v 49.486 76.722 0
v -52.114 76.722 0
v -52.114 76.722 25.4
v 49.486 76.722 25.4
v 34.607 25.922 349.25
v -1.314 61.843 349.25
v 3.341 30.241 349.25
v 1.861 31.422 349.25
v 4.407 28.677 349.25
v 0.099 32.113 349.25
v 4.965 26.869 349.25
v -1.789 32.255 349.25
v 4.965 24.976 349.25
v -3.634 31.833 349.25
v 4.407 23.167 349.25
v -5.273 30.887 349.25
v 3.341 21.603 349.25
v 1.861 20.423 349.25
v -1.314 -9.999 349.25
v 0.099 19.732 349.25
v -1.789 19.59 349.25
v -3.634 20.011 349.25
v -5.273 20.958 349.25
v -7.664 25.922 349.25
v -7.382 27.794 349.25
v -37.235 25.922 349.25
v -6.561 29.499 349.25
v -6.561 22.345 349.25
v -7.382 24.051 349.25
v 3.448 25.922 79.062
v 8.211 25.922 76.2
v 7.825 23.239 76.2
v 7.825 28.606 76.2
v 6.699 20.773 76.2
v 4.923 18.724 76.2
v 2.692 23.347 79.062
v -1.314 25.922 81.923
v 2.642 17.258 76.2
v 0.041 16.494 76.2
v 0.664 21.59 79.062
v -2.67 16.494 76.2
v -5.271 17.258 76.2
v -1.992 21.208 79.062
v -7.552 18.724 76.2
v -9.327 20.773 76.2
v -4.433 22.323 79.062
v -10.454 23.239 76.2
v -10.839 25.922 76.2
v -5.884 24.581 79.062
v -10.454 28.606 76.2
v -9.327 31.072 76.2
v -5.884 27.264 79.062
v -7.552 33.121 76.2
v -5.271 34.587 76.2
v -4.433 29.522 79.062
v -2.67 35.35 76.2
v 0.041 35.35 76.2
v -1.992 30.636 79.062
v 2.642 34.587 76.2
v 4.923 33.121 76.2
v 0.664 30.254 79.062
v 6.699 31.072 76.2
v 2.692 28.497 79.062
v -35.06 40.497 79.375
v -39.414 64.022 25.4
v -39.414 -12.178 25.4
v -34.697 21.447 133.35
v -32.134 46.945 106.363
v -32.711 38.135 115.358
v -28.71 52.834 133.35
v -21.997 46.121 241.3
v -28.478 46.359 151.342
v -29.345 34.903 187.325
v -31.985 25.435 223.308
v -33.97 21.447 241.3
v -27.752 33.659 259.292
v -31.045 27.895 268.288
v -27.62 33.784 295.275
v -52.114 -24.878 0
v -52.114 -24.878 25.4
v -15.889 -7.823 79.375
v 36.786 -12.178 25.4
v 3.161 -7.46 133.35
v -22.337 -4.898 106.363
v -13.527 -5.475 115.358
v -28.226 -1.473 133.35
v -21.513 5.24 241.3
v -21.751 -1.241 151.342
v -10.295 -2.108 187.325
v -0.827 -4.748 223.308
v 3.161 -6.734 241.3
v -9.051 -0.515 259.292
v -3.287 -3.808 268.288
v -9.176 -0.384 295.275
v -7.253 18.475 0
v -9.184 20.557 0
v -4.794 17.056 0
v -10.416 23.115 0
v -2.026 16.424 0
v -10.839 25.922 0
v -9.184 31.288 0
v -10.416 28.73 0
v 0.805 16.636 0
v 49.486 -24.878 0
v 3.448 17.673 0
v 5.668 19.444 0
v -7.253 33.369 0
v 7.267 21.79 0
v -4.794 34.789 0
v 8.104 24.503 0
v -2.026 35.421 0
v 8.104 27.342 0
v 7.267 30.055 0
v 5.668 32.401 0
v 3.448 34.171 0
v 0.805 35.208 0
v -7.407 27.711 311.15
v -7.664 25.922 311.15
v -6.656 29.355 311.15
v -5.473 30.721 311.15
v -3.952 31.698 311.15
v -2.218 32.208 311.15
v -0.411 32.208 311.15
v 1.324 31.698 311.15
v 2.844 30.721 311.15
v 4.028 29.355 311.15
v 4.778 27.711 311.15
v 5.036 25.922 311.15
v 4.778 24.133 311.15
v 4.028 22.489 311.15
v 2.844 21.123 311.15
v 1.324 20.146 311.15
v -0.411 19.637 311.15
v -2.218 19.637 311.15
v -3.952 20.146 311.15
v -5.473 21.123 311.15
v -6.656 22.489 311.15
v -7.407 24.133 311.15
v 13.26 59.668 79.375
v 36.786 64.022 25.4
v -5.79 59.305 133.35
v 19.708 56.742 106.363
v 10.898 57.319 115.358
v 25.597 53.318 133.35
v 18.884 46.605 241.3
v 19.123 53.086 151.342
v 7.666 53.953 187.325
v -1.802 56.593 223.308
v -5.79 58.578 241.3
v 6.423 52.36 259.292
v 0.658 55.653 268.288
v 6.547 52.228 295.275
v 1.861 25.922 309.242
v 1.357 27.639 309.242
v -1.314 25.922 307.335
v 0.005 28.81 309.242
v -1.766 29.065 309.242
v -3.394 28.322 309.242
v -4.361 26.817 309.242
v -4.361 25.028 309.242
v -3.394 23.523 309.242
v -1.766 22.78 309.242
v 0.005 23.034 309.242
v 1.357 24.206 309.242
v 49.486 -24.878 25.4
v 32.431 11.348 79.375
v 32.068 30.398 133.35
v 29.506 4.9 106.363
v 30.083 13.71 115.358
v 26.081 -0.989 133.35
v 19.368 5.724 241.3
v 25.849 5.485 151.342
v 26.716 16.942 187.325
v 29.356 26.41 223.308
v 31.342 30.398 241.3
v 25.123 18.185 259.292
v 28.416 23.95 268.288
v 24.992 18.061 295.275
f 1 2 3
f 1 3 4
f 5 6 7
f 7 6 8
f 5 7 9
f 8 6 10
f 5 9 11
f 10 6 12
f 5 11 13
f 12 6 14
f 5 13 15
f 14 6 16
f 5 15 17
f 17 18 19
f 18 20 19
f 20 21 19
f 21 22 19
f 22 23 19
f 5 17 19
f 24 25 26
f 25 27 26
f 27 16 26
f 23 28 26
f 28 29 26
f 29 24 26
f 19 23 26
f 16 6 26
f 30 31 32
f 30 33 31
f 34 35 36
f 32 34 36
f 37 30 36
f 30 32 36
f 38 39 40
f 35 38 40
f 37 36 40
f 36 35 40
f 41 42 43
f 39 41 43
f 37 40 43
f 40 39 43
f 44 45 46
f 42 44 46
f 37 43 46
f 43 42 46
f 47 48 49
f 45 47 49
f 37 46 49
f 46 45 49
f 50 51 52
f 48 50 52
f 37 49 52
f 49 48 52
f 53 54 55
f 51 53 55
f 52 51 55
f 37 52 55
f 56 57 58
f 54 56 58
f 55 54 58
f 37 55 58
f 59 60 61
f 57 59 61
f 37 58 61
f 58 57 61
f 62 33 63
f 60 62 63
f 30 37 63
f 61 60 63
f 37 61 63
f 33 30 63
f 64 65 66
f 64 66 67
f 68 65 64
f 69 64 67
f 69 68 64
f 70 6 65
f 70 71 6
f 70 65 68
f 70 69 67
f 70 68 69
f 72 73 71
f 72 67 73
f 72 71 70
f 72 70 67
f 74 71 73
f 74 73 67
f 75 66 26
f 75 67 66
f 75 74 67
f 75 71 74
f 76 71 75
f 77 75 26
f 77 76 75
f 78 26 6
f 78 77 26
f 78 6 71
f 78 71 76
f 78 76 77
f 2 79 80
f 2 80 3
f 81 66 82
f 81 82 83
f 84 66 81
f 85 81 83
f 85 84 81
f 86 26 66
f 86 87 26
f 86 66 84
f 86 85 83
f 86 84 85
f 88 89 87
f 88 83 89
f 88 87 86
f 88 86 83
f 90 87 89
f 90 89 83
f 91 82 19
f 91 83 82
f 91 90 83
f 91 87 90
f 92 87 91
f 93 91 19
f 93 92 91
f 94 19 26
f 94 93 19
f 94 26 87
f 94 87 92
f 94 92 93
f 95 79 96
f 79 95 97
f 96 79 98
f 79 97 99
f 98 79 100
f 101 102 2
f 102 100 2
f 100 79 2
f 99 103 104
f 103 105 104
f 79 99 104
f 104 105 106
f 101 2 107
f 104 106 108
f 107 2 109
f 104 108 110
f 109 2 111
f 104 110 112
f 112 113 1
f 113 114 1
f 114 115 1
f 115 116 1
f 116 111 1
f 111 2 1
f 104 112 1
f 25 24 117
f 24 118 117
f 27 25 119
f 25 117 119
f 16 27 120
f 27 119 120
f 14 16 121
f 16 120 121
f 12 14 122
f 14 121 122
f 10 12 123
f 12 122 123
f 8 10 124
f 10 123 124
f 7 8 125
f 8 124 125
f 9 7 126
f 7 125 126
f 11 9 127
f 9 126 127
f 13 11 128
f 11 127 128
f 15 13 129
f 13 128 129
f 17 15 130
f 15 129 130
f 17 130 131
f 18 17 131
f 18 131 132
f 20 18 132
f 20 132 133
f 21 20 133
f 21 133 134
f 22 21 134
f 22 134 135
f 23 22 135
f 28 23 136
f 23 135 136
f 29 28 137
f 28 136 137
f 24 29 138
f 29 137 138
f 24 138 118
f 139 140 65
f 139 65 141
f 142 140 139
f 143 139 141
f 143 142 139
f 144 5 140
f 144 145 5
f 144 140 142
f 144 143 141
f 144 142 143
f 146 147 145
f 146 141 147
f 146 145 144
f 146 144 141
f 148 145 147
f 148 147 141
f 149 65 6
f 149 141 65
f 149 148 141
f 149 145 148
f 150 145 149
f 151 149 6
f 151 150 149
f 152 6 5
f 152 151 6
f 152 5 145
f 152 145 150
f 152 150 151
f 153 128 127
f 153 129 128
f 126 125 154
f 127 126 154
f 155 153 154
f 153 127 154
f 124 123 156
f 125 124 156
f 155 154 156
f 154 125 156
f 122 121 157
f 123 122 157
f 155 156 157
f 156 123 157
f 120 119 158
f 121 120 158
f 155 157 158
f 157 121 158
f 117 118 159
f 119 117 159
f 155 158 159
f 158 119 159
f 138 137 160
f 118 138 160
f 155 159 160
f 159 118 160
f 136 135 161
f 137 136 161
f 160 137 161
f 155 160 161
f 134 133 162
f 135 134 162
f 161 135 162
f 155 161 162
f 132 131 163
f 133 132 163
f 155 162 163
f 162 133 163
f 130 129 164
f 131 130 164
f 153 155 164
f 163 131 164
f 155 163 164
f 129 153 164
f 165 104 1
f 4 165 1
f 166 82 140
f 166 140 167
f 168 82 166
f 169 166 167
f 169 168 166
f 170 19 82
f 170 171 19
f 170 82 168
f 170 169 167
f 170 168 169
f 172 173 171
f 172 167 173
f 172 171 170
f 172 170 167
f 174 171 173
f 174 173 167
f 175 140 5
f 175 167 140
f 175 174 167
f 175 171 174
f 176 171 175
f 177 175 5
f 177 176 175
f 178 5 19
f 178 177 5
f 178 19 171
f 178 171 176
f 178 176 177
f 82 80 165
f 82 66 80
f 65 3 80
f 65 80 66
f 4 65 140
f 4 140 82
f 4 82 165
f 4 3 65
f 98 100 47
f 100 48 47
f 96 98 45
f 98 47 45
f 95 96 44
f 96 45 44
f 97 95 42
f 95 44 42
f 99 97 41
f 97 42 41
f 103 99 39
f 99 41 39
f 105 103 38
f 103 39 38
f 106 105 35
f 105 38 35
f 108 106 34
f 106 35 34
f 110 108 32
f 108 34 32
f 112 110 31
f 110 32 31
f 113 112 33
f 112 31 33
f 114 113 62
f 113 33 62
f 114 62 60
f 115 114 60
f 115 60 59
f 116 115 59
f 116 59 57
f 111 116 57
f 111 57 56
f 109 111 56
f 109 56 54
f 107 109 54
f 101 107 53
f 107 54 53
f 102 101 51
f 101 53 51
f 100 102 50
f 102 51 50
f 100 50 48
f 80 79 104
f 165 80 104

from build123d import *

# Parameters (mm, degrees)
F0_W     = 101.6
F0_H     = 101.6
F0_W_2   = 76.2
F0_H_2   = 76.2
F1_DEPTH = 25.4
F2_W     = 76.2
F2_H     = 76.2
F6_D     = 19.05
F6_DEPTH = 76.2
F6_TIP   = 5.7231973962
F7_D     = 12.7
F7_DEPTH = 38.1
F7_TIP   = 3.8154649308


with BuildPart() as f1:
    # F0 (on Top) → F1 (new body)
    with BuildSketch(Plane.XY):
        with Locations((-1.3143327087, 25.9222988339)):
            Rectangle(F0_W, F0_H)
        with Locations((-1.3143327087, 25.9222988339)):
            Rectangle(F0_W_2, F0_H_2, mode=Mode.SUBTRACT)
        with Locations((-1.3143327087, 25.9222988339)):
            Rectangle(F0_W_2, F0_H_2)
    extrude(amount=F1_DEPTH)

    # F2 (on face) → F5 section 0
    with BuildSketch(Plane.XY.offset(25.4)):
        with Locations((-1.3143327087, 25.9222988339)):
            Rectangle(F2_W, F2_H)
    # F4 (on offset) → F5 section 1
    with BuildSketch(Plane.XY.offset(349.25)):
        Polygon((-1.3143327087, -9.9987256503), (34.6066917756, 25.9222988339), (-1.3143327087, 61.8433233182), (-37.235357193, 25.9222988339), align=None)
    loft()

    # F6
    with Locations(Plane(origin=(0, 0, 0), x_dir=(1, 0, 0), z_dir=(0, 0, -1))):
        with Locations((-1.3143327087, -25.9222988339)):
            Hole(F6_D / 2, depth=F6_DEPTH)
            with Locations((0, 0, -(F6_DEPTH + F6_TIP / 2))):  # 118° drill point
                Cone(0, F6_D / 2, F6_TIP, mode=Mode.SUBTRACT)

    # F7
    with Locations(Plane.XY.offset(349.25)):
        with Locations((-1.3143327087, 25.9222988339)):
            Hole(F7_D / 2, depth=F7_DEPTH)
            with Locations((0, 0, -(F7_DEPTH + F7_TIP / 2))):  # 118° drill point
                Cone(0, F7_D / 2, F7_TIP, mode=Mode.SUBTRACT)


solid = f1.part
